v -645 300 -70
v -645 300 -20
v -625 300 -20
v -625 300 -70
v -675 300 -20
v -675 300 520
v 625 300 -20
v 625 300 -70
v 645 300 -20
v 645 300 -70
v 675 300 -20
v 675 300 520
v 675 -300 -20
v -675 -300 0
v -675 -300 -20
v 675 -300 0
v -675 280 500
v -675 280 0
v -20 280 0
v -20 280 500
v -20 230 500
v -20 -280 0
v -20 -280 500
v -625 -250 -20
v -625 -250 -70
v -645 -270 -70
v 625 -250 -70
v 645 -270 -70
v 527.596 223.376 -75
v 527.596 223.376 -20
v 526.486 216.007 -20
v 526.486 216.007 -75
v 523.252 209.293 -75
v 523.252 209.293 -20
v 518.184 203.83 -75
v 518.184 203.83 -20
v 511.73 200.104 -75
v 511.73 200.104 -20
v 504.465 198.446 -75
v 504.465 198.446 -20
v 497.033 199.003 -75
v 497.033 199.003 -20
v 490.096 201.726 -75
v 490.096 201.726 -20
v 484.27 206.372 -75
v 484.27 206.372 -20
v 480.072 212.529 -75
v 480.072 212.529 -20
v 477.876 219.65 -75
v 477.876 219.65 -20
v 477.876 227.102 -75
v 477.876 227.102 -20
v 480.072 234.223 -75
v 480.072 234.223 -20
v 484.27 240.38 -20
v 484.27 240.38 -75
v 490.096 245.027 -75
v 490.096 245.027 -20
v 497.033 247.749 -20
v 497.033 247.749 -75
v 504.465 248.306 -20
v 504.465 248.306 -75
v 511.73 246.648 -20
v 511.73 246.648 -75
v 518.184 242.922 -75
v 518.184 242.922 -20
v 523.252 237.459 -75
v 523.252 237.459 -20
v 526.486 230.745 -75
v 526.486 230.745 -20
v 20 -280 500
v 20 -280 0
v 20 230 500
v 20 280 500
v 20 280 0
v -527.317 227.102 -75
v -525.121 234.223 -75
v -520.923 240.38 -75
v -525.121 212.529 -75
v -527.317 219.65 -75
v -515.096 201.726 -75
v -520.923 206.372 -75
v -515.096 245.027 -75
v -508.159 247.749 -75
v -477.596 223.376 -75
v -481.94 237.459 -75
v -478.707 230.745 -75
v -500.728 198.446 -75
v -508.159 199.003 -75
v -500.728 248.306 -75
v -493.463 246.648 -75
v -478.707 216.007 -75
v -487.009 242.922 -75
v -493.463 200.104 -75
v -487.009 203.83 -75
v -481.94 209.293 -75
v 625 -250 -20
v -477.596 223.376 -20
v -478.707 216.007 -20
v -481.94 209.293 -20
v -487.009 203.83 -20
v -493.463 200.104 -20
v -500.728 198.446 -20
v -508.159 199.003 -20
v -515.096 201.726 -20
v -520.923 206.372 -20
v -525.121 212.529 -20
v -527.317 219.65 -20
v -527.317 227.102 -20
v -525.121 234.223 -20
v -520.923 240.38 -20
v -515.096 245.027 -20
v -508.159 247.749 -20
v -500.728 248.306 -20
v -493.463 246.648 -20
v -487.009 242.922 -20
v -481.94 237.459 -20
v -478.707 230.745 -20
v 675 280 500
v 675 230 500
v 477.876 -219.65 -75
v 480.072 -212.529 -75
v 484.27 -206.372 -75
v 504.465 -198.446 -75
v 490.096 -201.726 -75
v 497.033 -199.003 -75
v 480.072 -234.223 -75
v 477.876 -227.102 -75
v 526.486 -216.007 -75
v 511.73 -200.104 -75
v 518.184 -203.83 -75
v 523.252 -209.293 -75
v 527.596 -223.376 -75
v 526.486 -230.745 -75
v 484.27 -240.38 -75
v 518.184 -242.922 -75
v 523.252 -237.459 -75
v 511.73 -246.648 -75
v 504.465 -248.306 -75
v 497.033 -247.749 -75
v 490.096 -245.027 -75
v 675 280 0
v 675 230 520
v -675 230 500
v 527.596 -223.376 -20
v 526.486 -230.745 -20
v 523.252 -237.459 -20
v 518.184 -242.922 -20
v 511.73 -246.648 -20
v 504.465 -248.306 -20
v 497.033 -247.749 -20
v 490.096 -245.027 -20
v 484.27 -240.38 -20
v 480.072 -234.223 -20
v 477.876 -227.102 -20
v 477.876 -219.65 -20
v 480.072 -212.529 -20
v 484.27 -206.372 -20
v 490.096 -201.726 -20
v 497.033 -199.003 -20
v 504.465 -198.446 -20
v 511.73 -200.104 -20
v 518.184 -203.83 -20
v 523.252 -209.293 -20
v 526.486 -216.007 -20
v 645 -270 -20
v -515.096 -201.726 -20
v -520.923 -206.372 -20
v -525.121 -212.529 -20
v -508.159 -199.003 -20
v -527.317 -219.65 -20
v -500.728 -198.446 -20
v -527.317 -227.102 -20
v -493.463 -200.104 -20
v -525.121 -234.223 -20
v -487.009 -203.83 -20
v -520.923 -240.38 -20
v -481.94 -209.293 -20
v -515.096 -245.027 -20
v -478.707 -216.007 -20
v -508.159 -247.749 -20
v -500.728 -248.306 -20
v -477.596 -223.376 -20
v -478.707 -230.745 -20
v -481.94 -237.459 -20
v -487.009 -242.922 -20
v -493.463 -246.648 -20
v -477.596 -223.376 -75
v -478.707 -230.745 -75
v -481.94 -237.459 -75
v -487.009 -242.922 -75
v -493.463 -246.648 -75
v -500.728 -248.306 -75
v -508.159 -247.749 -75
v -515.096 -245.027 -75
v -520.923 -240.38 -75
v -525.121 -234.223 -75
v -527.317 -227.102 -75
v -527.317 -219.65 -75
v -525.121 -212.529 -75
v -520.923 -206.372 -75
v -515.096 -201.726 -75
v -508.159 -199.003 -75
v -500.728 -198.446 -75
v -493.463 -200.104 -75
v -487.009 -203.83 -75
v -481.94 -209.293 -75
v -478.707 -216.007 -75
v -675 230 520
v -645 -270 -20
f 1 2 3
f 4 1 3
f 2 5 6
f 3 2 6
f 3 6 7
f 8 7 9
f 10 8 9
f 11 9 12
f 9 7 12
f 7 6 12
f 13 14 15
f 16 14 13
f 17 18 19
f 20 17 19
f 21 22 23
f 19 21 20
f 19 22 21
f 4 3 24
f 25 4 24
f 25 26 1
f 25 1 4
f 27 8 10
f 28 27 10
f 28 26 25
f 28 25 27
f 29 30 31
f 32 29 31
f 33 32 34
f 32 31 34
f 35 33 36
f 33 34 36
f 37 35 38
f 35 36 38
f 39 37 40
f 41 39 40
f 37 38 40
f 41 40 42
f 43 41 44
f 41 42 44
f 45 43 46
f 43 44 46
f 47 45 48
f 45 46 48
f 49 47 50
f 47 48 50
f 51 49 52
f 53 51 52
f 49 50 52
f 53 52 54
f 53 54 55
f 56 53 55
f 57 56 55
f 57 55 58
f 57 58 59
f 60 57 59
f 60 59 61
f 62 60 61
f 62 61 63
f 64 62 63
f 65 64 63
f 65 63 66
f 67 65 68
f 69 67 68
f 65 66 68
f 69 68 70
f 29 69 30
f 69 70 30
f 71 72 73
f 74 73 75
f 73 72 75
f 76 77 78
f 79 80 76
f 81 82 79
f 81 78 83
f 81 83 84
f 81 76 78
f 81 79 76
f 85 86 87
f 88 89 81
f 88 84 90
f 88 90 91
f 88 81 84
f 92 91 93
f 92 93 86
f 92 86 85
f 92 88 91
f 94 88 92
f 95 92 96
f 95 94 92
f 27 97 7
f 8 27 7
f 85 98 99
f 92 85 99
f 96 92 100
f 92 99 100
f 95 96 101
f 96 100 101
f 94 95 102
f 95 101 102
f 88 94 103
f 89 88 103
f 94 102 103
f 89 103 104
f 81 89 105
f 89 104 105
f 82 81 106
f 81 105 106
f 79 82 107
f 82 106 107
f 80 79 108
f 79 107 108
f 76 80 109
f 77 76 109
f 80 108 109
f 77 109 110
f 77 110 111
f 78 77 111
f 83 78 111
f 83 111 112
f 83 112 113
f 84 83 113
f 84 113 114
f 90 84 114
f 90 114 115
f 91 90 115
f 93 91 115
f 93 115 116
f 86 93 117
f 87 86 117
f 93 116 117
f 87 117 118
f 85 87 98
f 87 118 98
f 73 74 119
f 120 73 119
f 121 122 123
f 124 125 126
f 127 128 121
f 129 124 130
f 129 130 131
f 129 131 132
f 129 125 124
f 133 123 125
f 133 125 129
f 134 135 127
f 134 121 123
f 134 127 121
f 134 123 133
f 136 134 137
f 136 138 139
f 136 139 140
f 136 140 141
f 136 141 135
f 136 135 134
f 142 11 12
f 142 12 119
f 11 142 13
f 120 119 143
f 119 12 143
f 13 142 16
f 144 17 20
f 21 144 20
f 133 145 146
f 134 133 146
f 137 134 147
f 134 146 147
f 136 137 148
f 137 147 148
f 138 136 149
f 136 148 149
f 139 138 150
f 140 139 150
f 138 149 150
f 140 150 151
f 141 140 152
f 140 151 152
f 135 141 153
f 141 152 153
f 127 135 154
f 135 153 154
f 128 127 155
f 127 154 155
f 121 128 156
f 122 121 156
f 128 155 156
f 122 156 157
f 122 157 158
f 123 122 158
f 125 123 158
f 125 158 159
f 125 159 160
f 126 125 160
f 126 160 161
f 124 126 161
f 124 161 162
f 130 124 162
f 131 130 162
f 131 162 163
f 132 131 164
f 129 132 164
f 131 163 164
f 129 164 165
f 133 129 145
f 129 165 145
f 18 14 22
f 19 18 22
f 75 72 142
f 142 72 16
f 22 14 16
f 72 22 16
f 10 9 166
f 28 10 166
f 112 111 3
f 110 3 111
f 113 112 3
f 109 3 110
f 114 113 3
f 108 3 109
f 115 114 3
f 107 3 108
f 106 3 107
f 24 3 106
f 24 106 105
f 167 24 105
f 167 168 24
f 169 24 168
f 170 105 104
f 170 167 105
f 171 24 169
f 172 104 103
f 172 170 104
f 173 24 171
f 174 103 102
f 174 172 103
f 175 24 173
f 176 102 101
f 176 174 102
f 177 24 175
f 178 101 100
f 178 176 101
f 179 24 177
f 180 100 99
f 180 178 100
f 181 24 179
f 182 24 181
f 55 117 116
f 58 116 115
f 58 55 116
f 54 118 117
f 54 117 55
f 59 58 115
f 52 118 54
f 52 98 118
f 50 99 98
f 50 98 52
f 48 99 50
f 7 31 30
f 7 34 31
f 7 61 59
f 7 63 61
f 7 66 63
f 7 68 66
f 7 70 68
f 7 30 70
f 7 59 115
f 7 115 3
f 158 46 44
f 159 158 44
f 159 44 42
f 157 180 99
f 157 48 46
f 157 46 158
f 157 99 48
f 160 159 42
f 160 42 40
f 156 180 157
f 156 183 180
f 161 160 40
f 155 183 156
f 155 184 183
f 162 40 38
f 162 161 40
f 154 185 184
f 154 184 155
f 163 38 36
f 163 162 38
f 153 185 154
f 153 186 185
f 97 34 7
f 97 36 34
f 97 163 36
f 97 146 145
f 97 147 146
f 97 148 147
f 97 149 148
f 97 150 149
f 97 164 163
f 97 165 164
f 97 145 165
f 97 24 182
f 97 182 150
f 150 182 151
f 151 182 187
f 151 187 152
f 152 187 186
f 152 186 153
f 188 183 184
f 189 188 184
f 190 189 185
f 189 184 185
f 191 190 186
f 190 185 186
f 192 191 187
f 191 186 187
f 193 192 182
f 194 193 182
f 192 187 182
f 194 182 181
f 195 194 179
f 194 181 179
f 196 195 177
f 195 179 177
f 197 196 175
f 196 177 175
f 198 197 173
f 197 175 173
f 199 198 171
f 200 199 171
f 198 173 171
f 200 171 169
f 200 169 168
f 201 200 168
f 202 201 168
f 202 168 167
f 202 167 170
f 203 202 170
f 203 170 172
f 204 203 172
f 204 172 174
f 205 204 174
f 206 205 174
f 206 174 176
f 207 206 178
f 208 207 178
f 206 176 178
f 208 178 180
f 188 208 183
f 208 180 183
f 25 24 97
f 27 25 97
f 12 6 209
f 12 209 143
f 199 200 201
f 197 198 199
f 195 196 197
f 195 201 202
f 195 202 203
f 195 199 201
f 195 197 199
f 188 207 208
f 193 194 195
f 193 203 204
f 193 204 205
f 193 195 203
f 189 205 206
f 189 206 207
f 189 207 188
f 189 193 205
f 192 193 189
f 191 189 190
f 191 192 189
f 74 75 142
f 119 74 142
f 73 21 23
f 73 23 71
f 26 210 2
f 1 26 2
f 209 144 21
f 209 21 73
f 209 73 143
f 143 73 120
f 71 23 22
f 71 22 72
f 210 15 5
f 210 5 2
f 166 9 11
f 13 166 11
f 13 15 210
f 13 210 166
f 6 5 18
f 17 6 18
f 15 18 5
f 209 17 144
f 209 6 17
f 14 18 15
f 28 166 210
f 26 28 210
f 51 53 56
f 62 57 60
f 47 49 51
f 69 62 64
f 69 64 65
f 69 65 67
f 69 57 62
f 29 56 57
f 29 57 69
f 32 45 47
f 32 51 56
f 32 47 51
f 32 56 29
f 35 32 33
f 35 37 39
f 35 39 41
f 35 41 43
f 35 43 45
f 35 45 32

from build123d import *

# Parameters (mm, degrees)
F0_W     = 20
F0_H     = 560
F1_DEPTH = 500
F2_W     = 1350
F2_H     = 70
F3_DEPTH = 20
F4_W     = 1350
F4_H     = 600
F5_DEPTH = 20
F6_R     = 25
F7_DEPTH = 55
F9_DEPTH = 50


with BuildPart() as f1:
    # F0 (on Top) → F1 (new body)
    with BuildSketch(Plane.XY):
        Polygon((-675, 280), (-655, 280), (-20, 280), (0, 280), (20, 280), (655, 280), (675, 280), (675, 300), (-675, 300), align=None)
        with Locations((10, 0)):
            Rectangle(F0_W, F0_H)
        with Locations((-10, 0)):
            Rectangle(F0_W, F0_H)
    extrude(amount=F1_DEPTH)

    # F2 (on face) → F3 (join)
    with BuildSketch(Plane.XY.offset(500)):
        with Locations((0, 265)):
            Rectangle(F2_W, F2_H)
    extrude(amount=F3_DEPTH)

    # F4 (on face) → F5 (join)
    with BuildSketch(Plane(origin=(0, 0, 0), x_dir=(1, 0, 0), z_dir=(0, 0, -1))):
        Rectangle(F4_W, F4_H)
    extrude(amount=F5_DEPTH)

    # F6 (on face) → F7 (join)
    with BuildSketch(Plane(origin=(0, 0, -20), x_dir=(1, 0, 0), z_dir=(0, 0, -1))):
        with Locations((-502.596352, 223.376156)):
            Circle(F6_R)
        with Locations((-502.596352, -223.376156)):
            Circle(F6_R)
        with Locations((502.596352, -223.376156)):
            Circle(F6_R)
        with Locations((502.596352, 223.376156)):
            Circle(F6_R)
    extrude(amount=F7_DEPTH)

    # F8 (on face) → F9 (join)
    with BuildSketch(Plane(origin=(0, 0, -20), x_dir=(1, 0, 0), z_dir=(0, 0, -1))):
        Polygon((645, 270), (-645, 270), (-645, -270), (-645, -300), (-625, -300), (-625, -250), (-625, 250), (625, 250), (625, -250), (625, -300), (645, -300), (645, -270), align=None)
    extrude(amount=F9_DEPTH)


solid = f1.part
